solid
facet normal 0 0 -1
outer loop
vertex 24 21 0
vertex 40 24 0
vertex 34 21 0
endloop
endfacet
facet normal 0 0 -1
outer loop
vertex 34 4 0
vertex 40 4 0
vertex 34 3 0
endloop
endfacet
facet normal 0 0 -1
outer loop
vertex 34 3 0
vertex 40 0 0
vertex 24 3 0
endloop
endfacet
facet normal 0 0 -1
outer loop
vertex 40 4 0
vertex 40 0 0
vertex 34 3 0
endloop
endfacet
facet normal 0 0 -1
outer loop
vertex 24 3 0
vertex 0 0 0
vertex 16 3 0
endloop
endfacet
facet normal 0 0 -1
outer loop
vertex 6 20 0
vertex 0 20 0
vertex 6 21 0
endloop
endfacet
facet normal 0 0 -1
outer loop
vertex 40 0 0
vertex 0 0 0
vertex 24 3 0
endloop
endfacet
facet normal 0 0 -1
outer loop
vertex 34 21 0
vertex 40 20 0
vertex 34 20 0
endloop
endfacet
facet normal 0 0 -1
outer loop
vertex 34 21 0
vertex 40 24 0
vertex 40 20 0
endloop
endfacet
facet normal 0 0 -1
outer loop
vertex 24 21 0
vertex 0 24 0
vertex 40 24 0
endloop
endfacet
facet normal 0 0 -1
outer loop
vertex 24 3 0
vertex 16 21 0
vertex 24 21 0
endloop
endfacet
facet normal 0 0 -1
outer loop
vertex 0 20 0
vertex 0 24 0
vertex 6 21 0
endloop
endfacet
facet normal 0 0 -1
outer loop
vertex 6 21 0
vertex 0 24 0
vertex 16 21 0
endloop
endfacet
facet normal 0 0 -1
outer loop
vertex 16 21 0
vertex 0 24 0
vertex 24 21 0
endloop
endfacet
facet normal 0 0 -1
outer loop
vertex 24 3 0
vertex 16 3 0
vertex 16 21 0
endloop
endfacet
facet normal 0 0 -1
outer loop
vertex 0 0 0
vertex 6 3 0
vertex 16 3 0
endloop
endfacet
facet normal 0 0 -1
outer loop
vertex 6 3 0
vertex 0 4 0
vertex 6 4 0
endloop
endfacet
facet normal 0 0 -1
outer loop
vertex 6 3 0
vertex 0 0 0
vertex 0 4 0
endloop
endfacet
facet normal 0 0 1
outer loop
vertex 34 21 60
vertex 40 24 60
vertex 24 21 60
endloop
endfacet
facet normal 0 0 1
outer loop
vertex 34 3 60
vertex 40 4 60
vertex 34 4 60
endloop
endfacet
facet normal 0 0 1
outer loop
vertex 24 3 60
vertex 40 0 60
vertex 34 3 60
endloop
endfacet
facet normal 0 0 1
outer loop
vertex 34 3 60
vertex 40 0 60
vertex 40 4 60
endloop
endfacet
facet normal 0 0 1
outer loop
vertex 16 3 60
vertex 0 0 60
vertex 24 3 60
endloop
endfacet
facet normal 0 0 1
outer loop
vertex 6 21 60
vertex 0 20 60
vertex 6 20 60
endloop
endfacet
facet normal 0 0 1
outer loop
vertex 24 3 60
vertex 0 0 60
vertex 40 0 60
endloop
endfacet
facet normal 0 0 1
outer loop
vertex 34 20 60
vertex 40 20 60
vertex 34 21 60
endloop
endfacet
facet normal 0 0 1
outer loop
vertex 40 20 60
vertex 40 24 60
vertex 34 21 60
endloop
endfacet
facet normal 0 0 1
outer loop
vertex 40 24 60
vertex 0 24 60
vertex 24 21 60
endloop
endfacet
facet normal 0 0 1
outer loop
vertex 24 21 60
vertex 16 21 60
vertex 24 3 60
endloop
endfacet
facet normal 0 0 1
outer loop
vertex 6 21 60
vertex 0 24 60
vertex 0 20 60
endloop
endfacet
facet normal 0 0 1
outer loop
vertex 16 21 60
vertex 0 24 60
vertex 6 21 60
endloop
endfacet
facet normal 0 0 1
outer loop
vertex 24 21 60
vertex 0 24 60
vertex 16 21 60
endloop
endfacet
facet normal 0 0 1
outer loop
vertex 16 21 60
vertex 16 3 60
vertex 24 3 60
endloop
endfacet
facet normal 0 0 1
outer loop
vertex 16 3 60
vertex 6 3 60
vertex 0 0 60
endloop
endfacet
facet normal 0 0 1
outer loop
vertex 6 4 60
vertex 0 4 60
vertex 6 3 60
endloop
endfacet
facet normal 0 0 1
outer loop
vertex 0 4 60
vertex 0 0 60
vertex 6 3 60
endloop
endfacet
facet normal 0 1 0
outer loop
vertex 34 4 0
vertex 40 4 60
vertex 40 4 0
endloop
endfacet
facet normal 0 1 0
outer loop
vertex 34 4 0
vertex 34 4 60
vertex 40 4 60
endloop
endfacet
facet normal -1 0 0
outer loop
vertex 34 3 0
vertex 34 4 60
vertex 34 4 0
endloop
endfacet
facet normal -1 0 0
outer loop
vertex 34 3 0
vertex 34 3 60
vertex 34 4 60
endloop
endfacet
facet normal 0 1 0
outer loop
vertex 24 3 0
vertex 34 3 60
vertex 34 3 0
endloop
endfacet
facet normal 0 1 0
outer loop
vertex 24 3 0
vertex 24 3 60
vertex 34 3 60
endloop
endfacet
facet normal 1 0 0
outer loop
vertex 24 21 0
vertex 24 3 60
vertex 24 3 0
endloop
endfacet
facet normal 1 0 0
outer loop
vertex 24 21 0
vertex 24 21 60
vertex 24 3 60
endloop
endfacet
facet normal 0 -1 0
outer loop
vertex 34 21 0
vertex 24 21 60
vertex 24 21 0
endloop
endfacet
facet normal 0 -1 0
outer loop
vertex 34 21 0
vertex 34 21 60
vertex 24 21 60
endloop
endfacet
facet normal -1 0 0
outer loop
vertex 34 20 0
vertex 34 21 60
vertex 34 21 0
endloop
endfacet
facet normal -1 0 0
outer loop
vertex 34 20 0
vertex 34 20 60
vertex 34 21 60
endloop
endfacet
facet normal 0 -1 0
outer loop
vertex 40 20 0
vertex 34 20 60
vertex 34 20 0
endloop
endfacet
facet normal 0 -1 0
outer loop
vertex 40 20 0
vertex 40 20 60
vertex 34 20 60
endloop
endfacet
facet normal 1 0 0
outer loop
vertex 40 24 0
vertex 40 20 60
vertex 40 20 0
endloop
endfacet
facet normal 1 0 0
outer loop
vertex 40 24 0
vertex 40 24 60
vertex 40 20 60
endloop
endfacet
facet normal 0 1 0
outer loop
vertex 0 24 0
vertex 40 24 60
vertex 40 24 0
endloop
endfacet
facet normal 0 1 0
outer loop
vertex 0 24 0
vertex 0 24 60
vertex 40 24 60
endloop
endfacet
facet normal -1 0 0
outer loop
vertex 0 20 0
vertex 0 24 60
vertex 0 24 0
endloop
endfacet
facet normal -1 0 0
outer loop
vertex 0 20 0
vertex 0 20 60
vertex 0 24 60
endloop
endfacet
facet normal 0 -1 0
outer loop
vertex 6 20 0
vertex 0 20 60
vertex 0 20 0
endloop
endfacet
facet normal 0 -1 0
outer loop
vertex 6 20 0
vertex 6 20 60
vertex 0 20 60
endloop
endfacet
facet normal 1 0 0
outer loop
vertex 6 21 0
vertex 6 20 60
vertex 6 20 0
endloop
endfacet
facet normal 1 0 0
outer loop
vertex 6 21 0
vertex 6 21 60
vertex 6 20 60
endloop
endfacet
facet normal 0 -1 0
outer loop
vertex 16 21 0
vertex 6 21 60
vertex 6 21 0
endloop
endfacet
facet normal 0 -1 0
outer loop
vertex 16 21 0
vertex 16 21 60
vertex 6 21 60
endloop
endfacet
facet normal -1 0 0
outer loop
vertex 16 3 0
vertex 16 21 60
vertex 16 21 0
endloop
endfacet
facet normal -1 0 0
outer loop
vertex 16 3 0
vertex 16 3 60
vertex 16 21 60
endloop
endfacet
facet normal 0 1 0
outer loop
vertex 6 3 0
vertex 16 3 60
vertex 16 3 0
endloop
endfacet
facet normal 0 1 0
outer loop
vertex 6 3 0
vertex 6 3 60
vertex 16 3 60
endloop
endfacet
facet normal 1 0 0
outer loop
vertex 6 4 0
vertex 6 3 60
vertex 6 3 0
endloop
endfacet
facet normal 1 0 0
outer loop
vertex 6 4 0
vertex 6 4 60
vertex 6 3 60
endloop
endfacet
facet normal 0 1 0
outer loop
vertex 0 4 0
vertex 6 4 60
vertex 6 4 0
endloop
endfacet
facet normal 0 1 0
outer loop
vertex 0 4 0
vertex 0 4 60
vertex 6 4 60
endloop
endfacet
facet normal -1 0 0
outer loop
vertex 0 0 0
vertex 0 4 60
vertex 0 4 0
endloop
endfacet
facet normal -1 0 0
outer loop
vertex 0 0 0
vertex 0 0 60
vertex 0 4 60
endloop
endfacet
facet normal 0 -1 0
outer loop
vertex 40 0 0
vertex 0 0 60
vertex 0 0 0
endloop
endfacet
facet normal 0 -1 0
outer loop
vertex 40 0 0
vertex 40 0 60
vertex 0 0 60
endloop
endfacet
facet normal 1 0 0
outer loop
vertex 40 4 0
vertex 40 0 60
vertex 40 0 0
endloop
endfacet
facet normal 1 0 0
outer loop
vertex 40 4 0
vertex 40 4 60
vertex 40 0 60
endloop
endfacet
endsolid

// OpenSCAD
$fn = 32;

// ----------------------------------------------------------------------
// T-slot rail: 40 x 24 mm section, 60 mm long
// ----------------------------------------------------------------------

// --- parameters (mm) ---
profile_height = 60;      // extrusion height
profile_points = 20;      // points of the closed outline

profile = [[0, 0], [40, 0], [40, 4], [34, 4], [34, 3], [24, 3], [24, 21], [34, 21], [34, 20], [40, 20], [40, 24], [0, 24], [0, 20], [6, 20], [6, 21], [16, 21], [16, 3], [6, 3], [6, 4], [0, 4]];  // single closed polygon, 20 points, counter clockwise

// --- the one profile operation ---
linear_extrude(height = profile_height) polygon(points = profile);
